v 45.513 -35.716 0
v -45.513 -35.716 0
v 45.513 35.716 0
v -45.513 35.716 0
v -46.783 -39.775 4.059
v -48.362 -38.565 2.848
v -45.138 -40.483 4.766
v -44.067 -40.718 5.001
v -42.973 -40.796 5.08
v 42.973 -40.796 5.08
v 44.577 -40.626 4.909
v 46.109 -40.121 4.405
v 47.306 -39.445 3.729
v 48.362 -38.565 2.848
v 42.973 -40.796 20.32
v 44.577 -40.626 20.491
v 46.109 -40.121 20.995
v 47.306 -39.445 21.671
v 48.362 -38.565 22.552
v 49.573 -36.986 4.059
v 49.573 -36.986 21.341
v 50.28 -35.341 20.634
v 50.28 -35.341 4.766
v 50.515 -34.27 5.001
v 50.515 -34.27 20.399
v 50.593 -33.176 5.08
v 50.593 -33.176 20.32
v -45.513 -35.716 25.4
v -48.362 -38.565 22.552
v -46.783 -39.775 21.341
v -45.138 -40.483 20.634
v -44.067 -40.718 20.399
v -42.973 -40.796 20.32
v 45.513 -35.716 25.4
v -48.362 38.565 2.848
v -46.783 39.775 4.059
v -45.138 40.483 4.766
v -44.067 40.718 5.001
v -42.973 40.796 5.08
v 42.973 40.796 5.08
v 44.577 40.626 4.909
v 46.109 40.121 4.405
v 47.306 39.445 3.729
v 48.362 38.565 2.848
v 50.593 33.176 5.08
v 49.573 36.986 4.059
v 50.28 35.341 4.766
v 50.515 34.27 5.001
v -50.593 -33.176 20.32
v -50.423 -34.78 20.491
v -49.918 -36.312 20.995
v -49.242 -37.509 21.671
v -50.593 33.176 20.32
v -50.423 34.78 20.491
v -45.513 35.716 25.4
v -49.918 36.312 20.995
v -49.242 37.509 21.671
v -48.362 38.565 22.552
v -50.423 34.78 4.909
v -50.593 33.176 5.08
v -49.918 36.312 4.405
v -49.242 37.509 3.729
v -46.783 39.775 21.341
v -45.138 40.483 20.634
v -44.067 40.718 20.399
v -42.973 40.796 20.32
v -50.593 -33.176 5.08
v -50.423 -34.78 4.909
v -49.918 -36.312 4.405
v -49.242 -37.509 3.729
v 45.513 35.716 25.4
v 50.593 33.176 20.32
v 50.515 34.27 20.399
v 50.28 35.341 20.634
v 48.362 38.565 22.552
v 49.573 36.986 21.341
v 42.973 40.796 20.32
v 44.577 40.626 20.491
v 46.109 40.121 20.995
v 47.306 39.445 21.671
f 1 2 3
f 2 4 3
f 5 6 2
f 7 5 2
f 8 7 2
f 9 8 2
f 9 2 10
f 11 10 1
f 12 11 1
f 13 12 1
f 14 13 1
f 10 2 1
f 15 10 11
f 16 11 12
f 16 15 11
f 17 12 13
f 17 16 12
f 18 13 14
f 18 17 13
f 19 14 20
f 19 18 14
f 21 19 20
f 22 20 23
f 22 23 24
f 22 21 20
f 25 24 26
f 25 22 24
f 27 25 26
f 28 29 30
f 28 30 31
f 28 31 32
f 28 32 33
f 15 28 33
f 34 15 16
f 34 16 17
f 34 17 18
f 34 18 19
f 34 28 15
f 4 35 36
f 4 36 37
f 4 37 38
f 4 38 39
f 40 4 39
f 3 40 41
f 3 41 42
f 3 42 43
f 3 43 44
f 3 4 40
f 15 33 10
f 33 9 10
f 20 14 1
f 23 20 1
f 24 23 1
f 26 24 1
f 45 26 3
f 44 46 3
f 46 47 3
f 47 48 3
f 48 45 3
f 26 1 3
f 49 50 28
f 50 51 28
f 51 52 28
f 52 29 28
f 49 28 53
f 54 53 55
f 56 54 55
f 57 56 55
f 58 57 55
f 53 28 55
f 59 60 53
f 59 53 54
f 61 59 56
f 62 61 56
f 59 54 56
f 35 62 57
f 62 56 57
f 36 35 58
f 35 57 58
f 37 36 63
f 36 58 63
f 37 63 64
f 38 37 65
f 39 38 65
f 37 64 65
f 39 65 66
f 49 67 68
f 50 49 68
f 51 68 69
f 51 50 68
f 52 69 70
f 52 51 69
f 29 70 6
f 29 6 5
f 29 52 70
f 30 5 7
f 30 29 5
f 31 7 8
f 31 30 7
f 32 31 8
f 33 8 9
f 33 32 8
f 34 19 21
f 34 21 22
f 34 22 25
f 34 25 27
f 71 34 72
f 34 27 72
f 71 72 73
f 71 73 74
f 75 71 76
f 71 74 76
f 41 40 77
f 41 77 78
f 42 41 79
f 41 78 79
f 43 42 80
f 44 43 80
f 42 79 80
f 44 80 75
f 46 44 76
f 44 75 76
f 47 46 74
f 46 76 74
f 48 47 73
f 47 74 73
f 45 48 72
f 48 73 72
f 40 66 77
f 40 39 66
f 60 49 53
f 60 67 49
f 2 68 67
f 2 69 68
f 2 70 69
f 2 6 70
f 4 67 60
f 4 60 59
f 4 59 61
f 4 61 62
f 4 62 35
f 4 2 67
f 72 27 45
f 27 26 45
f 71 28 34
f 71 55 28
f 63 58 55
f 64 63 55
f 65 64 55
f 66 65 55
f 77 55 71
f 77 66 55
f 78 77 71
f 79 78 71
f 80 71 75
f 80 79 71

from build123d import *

# Parameters (mm, degrees)
F0_W     = 101.186872
F0_H     = 81.592738
F1_DEPTH = 25.4
F2_SIZE  = 5.08
F3_SIZE  = 5.08
F4_R     = 7.62


with BuildPart() as f1:
    # F0 (on Top) → F1 (new body)
    with BuildSketch(Plane.XY):
        Rectangle(F0_W, F0_H)
    extrude(amount=F1_DEPTH)

    # F2
    f2_edges = [f1.edges().sort_by_distance(p)[0] for p in [
        (0, -40.796369, 0),
        (-50.593436, 0, 0),
        (0, 40.796369, 0),
        (50.593436, 0, 0),
    ]]
    chamfer(f2_edges, length=F2_SIZE)

    # F3
    f3_edges = [f1.edges().sort_by_distance(p)[0] for p in [
        (0, -40.796369, 25.4),
        (50.593436, 0, 25.4),
        (0, 40.796369, 25.4),
        (-50.593436, 0, 25.4),
    ]]
    chamfer(f3_edges, length=F3_SIZE)

    # F4
    f4_edges = [f1.edges().sort_by_distance(p)[0] for p in [
        (-50.593436, -40.796369, 12.7),
        (-50.593436, 40.796369, 12.7),
        (50.593436, 40.796369, 12.7),
        (50.593436, -40.796369, 12.7),
    ]]
    fillet(f4_edges, radius=F4_R)


solid = f1.part
